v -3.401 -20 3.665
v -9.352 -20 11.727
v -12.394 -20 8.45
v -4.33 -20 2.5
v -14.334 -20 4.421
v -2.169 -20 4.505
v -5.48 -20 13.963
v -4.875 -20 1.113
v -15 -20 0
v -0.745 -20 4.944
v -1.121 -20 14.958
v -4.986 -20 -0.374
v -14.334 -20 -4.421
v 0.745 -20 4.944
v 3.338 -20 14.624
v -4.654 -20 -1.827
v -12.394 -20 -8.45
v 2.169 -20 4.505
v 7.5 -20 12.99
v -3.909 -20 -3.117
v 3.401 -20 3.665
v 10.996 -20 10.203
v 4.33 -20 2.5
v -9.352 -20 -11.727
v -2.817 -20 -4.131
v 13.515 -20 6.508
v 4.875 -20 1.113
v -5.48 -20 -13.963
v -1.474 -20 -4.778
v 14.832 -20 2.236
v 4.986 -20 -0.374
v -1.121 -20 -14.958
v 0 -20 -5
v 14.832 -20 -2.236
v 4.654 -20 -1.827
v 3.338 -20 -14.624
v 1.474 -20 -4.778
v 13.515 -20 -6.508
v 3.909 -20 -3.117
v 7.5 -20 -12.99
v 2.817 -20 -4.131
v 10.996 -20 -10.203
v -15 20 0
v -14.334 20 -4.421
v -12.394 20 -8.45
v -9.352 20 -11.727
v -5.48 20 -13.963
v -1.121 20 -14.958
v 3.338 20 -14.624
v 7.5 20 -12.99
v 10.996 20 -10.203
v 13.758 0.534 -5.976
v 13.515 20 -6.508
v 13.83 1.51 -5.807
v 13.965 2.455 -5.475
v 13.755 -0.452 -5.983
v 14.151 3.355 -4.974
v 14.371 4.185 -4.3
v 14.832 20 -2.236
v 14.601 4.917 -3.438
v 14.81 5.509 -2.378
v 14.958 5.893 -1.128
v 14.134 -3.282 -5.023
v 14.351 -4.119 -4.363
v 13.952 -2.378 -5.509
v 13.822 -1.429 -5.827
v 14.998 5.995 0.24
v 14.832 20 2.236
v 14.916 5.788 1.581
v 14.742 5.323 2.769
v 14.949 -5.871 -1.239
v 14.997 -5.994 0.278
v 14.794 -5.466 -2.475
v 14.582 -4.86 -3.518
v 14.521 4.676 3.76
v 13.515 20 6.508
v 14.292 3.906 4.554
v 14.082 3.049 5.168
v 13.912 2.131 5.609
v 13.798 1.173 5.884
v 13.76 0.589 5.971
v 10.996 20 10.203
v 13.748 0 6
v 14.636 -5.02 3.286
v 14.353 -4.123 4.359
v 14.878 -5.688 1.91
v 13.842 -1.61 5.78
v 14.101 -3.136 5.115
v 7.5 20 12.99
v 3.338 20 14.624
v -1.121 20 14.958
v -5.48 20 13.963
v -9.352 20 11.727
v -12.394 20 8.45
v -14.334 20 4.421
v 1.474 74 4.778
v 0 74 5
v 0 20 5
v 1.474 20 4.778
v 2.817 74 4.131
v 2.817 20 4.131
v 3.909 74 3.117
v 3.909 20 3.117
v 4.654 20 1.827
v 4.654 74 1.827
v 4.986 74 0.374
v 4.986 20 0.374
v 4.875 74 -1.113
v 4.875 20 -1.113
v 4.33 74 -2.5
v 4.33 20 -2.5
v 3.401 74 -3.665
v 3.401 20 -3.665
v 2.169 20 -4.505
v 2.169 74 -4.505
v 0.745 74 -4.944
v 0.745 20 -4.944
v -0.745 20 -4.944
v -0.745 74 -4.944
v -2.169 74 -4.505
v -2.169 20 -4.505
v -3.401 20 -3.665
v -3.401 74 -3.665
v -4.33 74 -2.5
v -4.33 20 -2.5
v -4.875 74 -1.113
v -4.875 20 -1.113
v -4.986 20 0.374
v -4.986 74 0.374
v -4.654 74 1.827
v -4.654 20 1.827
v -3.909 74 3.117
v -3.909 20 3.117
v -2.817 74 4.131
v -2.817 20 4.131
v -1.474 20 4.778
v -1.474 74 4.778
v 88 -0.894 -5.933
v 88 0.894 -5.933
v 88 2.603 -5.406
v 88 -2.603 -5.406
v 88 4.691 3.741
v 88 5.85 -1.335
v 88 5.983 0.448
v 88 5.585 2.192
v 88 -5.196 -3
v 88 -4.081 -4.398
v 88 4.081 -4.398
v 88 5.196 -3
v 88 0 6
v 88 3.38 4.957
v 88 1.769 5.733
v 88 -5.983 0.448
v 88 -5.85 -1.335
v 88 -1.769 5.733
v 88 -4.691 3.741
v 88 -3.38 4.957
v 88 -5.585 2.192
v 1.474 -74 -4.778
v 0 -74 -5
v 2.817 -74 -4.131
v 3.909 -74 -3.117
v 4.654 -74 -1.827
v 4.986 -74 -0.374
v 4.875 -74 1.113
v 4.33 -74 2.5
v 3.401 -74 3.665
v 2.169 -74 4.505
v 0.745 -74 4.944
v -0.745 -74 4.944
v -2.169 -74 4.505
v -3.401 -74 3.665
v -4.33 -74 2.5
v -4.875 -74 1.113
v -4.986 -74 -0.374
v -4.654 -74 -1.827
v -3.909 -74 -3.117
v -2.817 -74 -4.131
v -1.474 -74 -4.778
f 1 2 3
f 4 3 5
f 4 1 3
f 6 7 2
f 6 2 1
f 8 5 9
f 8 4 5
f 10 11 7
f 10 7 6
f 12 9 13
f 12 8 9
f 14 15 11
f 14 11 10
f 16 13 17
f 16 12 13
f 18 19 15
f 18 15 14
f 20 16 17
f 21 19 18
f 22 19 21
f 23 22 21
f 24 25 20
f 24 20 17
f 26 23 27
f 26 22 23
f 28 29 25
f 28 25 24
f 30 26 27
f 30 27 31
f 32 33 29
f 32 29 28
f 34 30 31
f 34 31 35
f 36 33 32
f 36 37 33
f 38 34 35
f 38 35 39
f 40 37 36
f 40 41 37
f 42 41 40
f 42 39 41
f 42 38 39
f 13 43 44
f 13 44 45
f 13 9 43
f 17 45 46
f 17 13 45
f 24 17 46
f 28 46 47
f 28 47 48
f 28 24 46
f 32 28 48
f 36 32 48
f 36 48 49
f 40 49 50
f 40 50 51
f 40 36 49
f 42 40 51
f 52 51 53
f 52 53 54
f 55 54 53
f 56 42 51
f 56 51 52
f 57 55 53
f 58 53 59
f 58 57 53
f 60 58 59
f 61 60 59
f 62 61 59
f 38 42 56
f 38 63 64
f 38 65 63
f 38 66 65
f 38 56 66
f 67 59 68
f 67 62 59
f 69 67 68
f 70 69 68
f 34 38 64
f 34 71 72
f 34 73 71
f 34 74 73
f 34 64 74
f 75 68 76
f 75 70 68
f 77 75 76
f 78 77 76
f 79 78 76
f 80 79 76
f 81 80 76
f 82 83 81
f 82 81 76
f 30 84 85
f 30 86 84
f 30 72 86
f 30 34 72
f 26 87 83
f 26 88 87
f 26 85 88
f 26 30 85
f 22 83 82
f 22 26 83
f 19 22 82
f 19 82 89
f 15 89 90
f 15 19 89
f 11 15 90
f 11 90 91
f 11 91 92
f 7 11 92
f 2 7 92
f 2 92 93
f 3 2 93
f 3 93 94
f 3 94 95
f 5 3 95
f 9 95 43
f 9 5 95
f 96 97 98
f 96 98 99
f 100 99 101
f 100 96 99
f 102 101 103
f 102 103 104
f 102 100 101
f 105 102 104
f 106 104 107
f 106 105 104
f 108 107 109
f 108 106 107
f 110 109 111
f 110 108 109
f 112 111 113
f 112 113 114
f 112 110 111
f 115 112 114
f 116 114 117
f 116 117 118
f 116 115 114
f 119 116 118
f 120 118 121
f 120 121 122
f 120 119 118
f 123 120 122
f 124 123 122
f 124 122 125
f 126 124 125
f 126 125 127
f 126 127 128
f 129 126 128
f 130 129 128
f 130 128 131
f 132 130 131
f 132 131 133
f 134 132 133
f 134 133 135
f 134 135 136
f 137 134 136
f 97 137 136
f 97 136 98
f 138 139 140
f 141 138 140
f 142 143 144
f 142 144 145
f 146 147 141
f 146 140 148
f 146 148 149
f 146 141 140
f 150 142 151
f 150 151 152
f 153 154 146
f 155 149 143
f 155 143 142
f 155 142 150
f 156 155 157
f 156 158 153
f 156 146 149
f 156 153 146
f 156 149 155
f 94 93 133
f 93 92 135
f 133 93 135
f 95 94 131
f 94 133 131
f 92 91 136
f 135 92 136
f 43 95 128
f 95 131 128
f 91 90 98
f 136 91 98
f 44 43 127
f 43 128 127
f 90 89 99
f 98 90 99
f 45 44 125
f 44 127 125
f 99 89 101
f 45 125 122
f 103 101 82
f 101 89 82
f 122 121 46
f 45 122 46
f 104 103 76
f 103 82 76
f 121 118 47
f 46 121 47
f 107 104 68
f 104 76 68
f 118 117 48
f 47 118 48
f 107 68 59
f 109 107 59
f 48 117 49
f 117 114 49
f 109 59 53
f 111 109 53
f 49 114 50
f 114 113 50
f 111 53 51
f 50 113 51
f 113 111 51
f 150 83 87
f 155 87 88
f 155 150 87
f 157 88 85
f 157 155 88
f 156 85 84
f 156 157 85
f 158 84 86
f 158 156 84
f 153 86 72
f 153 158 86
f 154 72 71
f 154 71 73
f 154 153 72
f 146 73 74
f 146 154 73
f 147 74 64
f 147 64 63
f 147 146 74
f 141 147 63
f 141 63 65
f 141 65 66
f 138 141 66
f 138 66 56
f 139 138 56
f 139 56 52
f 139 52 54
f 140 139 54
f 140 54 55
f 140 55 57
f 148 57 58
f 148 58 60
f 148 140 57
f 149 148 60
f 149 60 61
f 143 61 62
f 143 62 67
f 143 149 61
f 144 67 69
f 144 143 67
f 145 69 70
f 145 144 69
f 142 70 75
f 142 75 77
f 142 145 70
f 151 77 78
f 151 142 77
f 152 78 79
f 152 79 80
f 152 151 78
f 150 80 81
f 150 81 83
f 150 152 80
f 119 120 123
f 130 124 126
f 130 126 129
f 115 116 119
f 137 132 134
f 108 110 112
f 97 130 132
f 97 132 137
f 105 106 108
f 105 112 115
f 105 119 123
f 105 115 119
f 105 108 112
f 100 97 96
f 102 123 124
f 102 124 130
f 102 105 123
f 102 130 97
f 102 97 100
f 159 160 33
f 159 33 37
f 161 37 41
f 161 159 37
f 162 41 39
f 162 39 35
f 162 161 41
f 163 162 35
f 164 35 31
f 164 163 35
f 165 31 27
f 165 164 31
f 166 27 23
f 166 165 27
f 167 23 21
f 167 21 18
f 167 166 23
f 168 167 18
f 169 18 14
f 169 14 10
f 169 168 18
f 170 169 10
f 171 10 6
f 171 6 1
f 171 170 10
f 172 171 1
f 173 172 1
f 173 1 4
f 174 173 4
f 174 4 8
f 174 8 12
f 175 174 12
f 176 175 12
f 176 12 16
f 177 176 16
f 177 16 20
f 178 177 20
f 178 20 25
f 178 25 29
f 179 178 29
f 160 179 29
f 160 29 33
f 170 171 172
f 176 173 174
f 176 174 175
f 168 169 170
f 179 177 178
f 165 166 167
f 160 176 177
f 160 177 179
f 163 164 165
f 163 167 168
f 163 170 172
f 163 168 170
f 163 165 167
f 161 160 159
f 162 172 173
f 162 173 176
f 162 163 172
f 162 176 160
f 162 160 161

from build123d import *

# Parameters (mm, degrees)
SWEEP2_PROFILE_R = 15
SWEEP3_PROFILE_R = 6
SWEEP4_PROFILE_R = 5
SWEEP5_PROFILE_R = 5


with BuildPart() as part:
    # Sweep2: sweep along a path in Sketch1
    with BuildLine(Plane.XY) as sweep2_path:
        Line((0, 20), (0, -20))
    # Sweep2 profile (on start of the path) → Sweep2 (sweep)
    with BuildSketch(Plane(origin=(0, 20, 0), x_dir=(-1, 0, 0), z_dir=(0, -1, 0))):
        Circle(SWEEP2_PROFILE_R)
    sweep(path=sweep2_path.line)

    # Sweep3: sweep along a path in Sketch30
    with BuildLine(Plane.XY) as sweep3_path:
        Line((0, 0), (88, 0))
    # Sweep3 profile (on start of the path) → Sweep3 (sweep)
    with BuildSketch(Plane(origin=(0, 0, 0), x_dir=(0, 0, 1), z_dir=(1, 0, 0))):
        Circle(SWEEP3_PROFILE_R)
    sweep(path=sweep3_path.line)

    # Sweep4: sweep along a path in Sketch39
    with BuildLine(Plane.XY) as sweep4_path:
        Line((0, -20), (0, -74))
    # Sweep4 profile (on start of the path) → Sweep4 (sweep)
    with BuildSketch(Plane(origin=(0, -20, 0), x_dir=(0, 0, -1), z_dir=(0, -1, 0))):
        Circle(SWEEP4_PROFILE_R)
    sweep(path=sweep4_path.line)

    # Sweep5: sweep along a path in Sketch45
    with BuildLine(Plane.XY) as sweep5_path:
        Line((0, 20), (0, 74))
    # Sweep5 profile (on start of the path) → Sweep5 (sweep)
    with BuildSketch(Plane.ZX.offset(20)):
        Circle(SWEEP5_PROFILE_R)
    sweep(path=sweep5_path.line)


solid = part.part
